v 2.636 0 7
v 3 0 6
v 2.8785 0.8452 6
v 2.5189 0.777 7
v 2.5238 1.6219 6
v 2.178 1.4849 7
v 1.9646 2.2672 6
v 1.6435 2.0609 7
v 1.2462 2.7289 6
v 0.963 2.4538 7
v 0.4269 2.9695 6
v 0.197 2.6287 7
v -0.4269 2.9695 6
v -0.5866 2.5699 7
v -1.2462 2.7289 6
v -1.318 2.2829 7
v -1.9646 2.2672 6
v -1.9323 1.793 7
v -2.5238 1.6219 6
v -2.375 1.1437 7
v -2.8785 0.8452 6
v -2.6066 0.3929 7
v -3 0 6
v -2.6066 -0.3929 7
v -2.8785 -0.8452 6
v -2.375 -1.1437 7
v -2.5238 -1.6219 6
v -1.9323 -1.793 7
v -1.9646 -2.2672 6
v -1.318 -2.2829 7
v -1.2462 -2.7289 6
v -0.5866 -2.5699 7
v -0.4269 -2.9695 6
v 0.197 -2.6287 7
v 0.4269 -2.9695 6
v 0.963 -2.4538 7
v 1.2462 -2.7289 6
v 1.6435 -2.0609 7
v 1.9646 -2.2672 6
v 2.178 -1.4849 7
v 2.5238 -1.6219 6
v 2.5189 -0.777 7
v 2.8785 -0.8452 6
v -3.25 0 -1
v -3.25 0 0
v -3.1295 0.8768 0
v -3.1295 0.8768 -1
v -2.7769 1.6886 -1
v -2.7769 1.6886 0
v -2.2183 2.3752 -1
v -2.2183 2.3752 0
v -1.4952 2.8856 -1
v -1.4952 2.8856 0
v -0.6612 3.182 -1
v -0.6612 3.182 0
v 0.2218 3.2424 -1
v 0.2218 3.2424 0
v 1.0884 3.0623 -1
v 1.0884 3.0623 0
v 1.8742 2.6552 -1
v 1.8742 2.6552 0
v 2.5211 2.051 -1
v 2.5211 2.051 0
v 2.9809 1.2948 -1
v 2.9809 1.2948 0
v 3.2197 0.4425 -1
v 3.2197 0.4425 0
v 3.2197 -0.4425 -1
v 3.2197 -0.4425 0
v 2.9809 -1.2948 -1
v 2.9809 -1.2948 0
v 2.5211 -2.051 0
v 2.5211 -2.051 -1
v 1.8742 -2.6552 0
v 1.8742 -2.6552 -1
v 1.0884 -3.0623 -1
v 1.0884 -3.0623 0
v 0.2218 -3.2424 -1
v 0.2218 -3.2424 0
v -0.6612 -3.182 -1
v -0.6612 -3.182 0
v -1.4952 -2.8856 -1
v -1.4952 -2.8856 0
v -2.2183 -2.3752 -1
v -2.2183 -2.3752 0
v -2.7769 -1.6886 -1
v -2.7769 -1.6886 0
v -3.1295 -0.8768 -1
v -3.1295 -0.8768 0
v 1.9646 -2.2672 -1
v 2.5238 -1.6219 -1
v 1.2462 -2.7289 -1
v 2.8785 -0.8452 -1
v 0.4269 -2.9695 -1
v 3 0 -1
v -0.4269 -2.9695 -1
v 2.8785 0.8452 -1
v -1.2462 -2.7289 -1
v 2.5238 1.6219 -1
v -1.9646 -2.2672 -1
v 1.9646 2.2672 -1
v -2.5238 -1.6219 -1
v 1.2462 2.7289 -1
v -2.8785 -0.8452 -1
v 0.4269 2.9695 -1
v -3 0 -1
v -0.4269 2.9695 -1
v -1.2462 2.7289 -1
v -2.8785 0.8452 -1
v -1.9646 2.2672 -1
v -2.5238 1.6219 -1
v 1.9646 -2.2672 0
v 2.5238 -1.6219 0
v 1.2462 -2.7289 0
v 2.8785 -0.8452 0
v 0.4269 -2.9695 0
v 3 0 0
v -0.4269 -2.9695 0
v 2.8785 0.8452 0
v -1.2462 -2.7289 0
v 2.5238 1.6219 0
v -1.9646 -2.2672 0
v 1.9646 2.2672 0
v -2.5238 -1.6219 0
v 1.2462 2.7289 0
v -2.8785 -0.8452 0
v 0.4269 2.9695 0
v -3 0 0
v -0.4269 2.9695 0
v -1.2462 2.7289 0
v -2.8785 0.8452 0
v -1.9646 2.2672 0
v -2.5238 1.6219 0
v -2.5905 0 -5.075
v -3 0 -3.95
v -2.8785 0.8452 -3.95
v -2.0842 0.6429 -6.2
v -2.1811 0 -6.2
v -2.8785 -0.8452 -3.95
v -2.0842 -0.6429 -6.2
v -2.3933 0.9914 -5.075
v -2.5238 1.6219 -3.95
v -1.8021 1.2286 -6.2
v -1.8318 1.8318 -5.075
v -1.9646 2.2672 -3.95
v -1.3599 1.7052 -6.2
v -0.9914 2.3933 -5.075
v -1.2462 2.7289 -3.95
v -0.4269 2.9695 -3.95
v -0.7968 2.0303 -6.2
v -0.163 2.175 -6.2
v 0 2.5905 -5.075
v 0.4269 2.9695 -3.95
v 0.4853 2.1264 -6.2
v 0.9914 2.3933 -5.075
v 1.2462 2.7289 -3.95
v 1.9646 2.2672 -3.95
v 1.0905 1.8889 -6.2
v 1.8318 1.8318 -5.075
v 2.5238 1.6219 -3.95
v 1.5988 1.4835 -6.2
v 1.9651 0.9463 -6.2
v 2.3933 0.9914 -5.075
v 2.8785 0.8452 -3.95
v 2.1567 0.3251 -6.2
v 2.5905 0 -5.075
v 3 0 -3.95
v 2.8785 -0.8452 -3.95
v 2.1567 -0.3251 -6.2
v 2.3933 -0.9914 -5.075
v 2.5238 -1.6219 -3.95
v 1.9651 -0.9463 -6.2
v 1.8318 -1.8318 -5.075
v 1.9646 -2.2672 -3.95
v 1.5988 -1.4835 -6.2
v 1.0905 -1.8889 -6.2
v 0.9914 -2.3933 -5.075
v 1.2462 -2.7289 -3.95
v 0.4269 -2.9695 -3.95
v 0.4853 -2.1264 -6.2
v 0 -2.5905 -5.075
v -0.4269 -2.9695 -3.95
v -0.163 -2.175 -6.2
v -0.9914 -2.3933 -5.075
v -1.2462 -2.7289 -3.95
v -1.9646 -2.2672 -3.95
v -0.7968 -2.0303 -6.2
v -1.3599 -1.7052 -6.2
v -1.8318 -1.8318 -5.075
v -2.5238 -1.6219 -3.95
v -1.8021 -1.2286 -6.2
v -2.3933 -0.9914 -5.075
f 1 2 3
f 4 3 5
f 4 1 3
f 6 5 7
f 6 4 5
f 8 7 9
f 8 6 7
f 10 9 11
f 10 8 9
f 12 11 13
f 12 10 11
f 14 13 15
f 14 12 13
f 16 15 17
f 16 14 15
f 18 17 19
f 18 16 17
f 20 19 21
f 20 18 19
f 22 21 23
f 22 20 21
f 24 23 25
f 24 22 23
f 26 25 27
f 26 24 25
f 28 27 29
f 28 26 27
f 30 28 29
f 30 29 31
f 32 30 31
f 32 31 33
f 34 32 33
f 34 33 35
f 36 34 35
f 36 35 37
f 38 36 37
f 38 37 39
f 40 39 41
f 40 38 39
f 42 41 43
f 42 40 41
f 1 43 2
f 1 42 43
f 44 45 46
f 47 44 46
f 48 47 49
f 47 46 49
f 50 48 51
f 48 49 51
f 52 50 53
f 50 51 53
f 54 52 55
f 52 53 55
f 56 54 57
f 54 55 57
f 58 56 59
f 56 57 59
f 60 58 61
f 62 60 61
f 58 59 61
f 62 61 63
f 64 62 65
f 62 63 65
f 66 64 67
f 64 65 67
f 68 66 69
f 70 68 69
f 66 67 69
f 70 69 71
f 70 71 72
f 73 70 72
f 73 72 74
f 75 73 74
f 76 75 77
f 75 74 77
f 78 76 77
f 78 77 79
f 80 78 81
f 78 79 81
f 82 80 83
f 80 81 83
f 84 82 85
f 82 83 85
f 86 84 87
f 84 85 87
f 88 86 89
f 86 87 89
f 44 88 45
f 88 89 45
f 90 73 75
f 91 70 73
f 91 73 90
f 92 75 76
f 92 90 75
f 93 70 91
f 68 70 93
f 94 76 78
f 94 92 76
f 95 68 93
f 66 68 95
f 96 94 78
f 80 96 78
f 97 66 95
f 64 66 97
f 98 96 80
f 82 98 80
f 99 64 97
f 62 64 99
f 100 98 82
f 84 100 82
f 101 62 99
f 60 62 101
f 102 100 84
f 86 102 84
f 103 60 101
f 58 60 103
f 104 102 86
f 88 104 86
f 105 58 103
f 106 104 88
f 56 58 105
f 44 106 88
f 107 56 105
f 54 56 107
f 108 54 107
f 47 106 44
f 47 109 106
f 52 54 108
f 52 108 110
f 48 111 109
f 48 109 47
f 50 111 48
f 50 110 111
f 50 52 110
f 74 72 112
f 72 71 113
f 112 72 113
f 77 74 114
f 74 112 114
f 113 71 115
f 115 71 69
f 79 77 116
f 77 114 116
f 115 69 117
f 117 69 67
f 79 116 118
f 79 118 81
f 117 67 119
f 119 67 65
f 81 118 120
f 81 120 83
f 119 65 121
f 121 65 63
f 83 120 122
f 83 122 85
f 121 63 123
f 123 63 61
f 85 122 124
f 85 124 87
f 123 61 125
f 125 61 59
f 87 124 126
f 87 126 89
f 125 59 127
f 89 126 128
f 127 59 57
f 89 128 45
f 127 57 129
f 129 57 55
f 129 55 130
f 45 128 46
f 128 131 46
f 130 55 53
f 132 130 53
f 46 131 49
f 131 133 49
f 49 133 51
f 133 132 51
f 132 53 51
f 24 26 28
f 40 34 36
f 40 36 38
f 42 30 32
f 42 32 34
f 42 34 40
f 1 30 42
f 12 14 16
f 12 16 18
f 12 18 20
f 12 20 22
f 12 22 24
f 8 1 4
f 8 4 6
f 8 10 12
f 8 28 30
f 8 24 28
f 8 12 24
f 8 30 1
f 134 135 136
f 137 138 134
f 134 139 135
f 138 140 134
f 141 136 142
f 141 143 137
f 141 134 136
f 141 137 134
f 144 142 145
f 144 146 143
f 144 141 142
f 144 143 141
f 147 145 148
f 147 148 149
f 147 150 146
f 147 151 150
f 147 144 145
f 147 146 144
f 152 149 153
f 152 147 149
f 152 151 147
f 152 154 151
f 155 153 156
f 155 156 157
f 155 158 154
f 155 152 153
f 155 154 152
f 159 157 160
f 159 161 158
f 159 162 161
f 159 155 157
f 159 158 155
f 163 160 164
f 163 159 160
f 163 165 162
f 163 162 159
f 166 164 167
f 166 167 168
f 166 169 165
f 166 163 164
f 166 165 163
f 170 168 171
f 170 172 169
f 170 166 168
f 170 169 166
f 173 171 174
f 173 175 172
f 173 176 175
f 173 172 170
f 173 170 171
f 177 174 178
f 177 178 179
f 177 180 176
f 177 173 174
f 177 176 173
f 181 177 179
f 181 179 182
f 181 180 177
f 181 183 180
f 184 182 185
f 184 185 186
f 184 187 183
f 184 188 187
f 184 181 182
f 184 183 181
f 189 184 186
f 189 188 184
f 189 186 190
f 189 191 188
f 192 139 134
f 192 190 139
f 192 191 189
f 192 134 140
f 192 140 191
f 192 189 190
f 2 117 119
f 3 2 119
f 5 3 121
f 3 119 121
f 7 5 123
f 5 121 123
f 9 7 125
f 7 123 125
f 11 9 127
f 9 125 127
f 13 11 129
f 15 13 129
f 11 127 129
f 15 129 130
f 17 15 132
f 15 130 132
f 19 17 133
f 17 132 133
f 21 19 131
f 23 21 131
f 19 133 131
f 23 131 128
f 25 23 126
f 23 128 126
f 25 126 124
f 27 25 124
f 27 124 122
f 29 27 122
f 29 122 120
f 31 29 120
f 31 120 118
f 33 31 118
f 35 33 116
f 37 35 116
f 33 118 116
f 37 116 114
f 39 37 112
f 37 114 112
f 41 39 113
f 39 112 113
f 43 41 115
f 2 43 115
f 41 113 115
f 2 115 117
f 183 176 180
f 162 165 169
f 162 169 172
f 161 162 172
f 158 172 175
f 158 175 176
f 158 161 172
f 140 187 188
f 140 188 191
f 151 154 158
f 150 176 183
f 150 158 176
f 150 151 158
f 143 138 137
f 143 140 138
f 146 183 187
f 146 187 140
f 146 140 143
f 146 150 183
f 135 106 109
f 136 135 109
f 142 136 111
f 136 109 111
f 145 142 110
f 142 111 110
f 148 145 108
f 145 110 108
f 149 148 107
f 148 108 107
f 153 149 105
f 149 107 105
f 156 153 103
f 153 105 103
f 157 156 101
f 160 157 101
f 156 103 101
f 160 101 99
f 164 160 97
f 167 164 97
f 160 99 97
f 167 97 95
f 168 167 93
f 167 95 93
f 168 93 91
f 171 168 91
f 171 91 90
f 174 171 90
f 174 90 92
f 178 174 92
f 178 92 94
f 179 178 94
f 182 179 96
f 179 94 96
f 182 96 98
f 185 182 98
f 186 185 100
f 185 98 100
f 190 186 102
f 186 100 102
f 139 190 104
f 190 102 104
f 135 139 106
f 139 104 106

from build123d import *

# Parameters (mm, degrees)
SKETCH1_R           = 3
BOSS_EXTRUDE1_DEPTH = 7
CHAMFER1_SIZE       = 1
CHAMFER1_SIZE2      = 0.363970234
SKETCH2_R           = 3.25
BOSS_EXTRUDE3_DEPTH = 1
BOSS_EXTRUDE4_START = 5.2
SKETCH4_R           = 3
BOSS_EXTRUDE4_DEPTH = 5.2
CHAMFER2_SIZE       = 2.25
CHAMFER2_SIZE2      = 0.818933027
SKETCH2_2_R         = 3.25
BOSS_EXTRUDE5_DEPTH = 1


with BuildPart() as part:
    # Sketch1 → Boss-Extrude1 (new body)
    with BuildSketch(Plane.XY):
        Circle(SKETCH1_R)
    extrude(amount=BOSS_EXTRUDE1_DEPTH)

    # Chamfer1
    chamfer1_edges = [part.edges().sort_by_distance(p)[0] for p in [
        (-3, 0, 7),
    ]]
    chamfer1_side = [part.faces().sort_by_distance(p)[0] for p in [
        (-3, 0, 3.5),
    ]]
    chamfer(chamfer1_edges, length=CHAMFER1_SIZE, length2=CHAMFER1_SIZE2, reference=chamfer1_side[0])

    # Sketch2 → Boss-Extrude3 (add)
    with BuildSketch(Plane(origin=(0, 0, 0), x_dir=(-1, 0, 0), z_dir=(0, 0, -1))):
        Circle(SKETCH2_R)
    extrude(amount=BOSS_EXTRUDE3_DEPTH)

    # Sketch4 → Boss-Extrude4 (add)
    with BuildSketch(Plane(origin=(0, 0, -1), x_dir=(-1, 0, 0), z_dir=(0, 0, -1)).offset(BOSS_EXTRUDE4_START)):
        Circle(SKETCH4_R)
    extrude(amount=-BOSS_EXTRUDE4_DEPTH)

    # Chamfer2
    chamfer2_edges = [part.edges().sort_by_distance(p)[0] for p in [
        (3, 0, -6.2),
    ]]
    chamfer2_side = [part.faces().sort_by_distance(p)[0] for p in [
        (3, 0, -3.6),
    ]]
    chamfer(chamfer2_edges, length=CHAMFER2_SIZE, length2=CHAMFER2_SIZE2, reference=chamfer2_side[0])

    # Sketch2<2> → Boss-Extrude5 (add)
    with BuildSketch(Plane(origin=(0, 0, 0), x_dir=(-1, 0, 0), z_dir=(0, 0, -1))):
        Circle(SKETCH2_2_R)
    extrude(amount=BOSS_EXTRUDE5_DEPTH)


solid = part.part
